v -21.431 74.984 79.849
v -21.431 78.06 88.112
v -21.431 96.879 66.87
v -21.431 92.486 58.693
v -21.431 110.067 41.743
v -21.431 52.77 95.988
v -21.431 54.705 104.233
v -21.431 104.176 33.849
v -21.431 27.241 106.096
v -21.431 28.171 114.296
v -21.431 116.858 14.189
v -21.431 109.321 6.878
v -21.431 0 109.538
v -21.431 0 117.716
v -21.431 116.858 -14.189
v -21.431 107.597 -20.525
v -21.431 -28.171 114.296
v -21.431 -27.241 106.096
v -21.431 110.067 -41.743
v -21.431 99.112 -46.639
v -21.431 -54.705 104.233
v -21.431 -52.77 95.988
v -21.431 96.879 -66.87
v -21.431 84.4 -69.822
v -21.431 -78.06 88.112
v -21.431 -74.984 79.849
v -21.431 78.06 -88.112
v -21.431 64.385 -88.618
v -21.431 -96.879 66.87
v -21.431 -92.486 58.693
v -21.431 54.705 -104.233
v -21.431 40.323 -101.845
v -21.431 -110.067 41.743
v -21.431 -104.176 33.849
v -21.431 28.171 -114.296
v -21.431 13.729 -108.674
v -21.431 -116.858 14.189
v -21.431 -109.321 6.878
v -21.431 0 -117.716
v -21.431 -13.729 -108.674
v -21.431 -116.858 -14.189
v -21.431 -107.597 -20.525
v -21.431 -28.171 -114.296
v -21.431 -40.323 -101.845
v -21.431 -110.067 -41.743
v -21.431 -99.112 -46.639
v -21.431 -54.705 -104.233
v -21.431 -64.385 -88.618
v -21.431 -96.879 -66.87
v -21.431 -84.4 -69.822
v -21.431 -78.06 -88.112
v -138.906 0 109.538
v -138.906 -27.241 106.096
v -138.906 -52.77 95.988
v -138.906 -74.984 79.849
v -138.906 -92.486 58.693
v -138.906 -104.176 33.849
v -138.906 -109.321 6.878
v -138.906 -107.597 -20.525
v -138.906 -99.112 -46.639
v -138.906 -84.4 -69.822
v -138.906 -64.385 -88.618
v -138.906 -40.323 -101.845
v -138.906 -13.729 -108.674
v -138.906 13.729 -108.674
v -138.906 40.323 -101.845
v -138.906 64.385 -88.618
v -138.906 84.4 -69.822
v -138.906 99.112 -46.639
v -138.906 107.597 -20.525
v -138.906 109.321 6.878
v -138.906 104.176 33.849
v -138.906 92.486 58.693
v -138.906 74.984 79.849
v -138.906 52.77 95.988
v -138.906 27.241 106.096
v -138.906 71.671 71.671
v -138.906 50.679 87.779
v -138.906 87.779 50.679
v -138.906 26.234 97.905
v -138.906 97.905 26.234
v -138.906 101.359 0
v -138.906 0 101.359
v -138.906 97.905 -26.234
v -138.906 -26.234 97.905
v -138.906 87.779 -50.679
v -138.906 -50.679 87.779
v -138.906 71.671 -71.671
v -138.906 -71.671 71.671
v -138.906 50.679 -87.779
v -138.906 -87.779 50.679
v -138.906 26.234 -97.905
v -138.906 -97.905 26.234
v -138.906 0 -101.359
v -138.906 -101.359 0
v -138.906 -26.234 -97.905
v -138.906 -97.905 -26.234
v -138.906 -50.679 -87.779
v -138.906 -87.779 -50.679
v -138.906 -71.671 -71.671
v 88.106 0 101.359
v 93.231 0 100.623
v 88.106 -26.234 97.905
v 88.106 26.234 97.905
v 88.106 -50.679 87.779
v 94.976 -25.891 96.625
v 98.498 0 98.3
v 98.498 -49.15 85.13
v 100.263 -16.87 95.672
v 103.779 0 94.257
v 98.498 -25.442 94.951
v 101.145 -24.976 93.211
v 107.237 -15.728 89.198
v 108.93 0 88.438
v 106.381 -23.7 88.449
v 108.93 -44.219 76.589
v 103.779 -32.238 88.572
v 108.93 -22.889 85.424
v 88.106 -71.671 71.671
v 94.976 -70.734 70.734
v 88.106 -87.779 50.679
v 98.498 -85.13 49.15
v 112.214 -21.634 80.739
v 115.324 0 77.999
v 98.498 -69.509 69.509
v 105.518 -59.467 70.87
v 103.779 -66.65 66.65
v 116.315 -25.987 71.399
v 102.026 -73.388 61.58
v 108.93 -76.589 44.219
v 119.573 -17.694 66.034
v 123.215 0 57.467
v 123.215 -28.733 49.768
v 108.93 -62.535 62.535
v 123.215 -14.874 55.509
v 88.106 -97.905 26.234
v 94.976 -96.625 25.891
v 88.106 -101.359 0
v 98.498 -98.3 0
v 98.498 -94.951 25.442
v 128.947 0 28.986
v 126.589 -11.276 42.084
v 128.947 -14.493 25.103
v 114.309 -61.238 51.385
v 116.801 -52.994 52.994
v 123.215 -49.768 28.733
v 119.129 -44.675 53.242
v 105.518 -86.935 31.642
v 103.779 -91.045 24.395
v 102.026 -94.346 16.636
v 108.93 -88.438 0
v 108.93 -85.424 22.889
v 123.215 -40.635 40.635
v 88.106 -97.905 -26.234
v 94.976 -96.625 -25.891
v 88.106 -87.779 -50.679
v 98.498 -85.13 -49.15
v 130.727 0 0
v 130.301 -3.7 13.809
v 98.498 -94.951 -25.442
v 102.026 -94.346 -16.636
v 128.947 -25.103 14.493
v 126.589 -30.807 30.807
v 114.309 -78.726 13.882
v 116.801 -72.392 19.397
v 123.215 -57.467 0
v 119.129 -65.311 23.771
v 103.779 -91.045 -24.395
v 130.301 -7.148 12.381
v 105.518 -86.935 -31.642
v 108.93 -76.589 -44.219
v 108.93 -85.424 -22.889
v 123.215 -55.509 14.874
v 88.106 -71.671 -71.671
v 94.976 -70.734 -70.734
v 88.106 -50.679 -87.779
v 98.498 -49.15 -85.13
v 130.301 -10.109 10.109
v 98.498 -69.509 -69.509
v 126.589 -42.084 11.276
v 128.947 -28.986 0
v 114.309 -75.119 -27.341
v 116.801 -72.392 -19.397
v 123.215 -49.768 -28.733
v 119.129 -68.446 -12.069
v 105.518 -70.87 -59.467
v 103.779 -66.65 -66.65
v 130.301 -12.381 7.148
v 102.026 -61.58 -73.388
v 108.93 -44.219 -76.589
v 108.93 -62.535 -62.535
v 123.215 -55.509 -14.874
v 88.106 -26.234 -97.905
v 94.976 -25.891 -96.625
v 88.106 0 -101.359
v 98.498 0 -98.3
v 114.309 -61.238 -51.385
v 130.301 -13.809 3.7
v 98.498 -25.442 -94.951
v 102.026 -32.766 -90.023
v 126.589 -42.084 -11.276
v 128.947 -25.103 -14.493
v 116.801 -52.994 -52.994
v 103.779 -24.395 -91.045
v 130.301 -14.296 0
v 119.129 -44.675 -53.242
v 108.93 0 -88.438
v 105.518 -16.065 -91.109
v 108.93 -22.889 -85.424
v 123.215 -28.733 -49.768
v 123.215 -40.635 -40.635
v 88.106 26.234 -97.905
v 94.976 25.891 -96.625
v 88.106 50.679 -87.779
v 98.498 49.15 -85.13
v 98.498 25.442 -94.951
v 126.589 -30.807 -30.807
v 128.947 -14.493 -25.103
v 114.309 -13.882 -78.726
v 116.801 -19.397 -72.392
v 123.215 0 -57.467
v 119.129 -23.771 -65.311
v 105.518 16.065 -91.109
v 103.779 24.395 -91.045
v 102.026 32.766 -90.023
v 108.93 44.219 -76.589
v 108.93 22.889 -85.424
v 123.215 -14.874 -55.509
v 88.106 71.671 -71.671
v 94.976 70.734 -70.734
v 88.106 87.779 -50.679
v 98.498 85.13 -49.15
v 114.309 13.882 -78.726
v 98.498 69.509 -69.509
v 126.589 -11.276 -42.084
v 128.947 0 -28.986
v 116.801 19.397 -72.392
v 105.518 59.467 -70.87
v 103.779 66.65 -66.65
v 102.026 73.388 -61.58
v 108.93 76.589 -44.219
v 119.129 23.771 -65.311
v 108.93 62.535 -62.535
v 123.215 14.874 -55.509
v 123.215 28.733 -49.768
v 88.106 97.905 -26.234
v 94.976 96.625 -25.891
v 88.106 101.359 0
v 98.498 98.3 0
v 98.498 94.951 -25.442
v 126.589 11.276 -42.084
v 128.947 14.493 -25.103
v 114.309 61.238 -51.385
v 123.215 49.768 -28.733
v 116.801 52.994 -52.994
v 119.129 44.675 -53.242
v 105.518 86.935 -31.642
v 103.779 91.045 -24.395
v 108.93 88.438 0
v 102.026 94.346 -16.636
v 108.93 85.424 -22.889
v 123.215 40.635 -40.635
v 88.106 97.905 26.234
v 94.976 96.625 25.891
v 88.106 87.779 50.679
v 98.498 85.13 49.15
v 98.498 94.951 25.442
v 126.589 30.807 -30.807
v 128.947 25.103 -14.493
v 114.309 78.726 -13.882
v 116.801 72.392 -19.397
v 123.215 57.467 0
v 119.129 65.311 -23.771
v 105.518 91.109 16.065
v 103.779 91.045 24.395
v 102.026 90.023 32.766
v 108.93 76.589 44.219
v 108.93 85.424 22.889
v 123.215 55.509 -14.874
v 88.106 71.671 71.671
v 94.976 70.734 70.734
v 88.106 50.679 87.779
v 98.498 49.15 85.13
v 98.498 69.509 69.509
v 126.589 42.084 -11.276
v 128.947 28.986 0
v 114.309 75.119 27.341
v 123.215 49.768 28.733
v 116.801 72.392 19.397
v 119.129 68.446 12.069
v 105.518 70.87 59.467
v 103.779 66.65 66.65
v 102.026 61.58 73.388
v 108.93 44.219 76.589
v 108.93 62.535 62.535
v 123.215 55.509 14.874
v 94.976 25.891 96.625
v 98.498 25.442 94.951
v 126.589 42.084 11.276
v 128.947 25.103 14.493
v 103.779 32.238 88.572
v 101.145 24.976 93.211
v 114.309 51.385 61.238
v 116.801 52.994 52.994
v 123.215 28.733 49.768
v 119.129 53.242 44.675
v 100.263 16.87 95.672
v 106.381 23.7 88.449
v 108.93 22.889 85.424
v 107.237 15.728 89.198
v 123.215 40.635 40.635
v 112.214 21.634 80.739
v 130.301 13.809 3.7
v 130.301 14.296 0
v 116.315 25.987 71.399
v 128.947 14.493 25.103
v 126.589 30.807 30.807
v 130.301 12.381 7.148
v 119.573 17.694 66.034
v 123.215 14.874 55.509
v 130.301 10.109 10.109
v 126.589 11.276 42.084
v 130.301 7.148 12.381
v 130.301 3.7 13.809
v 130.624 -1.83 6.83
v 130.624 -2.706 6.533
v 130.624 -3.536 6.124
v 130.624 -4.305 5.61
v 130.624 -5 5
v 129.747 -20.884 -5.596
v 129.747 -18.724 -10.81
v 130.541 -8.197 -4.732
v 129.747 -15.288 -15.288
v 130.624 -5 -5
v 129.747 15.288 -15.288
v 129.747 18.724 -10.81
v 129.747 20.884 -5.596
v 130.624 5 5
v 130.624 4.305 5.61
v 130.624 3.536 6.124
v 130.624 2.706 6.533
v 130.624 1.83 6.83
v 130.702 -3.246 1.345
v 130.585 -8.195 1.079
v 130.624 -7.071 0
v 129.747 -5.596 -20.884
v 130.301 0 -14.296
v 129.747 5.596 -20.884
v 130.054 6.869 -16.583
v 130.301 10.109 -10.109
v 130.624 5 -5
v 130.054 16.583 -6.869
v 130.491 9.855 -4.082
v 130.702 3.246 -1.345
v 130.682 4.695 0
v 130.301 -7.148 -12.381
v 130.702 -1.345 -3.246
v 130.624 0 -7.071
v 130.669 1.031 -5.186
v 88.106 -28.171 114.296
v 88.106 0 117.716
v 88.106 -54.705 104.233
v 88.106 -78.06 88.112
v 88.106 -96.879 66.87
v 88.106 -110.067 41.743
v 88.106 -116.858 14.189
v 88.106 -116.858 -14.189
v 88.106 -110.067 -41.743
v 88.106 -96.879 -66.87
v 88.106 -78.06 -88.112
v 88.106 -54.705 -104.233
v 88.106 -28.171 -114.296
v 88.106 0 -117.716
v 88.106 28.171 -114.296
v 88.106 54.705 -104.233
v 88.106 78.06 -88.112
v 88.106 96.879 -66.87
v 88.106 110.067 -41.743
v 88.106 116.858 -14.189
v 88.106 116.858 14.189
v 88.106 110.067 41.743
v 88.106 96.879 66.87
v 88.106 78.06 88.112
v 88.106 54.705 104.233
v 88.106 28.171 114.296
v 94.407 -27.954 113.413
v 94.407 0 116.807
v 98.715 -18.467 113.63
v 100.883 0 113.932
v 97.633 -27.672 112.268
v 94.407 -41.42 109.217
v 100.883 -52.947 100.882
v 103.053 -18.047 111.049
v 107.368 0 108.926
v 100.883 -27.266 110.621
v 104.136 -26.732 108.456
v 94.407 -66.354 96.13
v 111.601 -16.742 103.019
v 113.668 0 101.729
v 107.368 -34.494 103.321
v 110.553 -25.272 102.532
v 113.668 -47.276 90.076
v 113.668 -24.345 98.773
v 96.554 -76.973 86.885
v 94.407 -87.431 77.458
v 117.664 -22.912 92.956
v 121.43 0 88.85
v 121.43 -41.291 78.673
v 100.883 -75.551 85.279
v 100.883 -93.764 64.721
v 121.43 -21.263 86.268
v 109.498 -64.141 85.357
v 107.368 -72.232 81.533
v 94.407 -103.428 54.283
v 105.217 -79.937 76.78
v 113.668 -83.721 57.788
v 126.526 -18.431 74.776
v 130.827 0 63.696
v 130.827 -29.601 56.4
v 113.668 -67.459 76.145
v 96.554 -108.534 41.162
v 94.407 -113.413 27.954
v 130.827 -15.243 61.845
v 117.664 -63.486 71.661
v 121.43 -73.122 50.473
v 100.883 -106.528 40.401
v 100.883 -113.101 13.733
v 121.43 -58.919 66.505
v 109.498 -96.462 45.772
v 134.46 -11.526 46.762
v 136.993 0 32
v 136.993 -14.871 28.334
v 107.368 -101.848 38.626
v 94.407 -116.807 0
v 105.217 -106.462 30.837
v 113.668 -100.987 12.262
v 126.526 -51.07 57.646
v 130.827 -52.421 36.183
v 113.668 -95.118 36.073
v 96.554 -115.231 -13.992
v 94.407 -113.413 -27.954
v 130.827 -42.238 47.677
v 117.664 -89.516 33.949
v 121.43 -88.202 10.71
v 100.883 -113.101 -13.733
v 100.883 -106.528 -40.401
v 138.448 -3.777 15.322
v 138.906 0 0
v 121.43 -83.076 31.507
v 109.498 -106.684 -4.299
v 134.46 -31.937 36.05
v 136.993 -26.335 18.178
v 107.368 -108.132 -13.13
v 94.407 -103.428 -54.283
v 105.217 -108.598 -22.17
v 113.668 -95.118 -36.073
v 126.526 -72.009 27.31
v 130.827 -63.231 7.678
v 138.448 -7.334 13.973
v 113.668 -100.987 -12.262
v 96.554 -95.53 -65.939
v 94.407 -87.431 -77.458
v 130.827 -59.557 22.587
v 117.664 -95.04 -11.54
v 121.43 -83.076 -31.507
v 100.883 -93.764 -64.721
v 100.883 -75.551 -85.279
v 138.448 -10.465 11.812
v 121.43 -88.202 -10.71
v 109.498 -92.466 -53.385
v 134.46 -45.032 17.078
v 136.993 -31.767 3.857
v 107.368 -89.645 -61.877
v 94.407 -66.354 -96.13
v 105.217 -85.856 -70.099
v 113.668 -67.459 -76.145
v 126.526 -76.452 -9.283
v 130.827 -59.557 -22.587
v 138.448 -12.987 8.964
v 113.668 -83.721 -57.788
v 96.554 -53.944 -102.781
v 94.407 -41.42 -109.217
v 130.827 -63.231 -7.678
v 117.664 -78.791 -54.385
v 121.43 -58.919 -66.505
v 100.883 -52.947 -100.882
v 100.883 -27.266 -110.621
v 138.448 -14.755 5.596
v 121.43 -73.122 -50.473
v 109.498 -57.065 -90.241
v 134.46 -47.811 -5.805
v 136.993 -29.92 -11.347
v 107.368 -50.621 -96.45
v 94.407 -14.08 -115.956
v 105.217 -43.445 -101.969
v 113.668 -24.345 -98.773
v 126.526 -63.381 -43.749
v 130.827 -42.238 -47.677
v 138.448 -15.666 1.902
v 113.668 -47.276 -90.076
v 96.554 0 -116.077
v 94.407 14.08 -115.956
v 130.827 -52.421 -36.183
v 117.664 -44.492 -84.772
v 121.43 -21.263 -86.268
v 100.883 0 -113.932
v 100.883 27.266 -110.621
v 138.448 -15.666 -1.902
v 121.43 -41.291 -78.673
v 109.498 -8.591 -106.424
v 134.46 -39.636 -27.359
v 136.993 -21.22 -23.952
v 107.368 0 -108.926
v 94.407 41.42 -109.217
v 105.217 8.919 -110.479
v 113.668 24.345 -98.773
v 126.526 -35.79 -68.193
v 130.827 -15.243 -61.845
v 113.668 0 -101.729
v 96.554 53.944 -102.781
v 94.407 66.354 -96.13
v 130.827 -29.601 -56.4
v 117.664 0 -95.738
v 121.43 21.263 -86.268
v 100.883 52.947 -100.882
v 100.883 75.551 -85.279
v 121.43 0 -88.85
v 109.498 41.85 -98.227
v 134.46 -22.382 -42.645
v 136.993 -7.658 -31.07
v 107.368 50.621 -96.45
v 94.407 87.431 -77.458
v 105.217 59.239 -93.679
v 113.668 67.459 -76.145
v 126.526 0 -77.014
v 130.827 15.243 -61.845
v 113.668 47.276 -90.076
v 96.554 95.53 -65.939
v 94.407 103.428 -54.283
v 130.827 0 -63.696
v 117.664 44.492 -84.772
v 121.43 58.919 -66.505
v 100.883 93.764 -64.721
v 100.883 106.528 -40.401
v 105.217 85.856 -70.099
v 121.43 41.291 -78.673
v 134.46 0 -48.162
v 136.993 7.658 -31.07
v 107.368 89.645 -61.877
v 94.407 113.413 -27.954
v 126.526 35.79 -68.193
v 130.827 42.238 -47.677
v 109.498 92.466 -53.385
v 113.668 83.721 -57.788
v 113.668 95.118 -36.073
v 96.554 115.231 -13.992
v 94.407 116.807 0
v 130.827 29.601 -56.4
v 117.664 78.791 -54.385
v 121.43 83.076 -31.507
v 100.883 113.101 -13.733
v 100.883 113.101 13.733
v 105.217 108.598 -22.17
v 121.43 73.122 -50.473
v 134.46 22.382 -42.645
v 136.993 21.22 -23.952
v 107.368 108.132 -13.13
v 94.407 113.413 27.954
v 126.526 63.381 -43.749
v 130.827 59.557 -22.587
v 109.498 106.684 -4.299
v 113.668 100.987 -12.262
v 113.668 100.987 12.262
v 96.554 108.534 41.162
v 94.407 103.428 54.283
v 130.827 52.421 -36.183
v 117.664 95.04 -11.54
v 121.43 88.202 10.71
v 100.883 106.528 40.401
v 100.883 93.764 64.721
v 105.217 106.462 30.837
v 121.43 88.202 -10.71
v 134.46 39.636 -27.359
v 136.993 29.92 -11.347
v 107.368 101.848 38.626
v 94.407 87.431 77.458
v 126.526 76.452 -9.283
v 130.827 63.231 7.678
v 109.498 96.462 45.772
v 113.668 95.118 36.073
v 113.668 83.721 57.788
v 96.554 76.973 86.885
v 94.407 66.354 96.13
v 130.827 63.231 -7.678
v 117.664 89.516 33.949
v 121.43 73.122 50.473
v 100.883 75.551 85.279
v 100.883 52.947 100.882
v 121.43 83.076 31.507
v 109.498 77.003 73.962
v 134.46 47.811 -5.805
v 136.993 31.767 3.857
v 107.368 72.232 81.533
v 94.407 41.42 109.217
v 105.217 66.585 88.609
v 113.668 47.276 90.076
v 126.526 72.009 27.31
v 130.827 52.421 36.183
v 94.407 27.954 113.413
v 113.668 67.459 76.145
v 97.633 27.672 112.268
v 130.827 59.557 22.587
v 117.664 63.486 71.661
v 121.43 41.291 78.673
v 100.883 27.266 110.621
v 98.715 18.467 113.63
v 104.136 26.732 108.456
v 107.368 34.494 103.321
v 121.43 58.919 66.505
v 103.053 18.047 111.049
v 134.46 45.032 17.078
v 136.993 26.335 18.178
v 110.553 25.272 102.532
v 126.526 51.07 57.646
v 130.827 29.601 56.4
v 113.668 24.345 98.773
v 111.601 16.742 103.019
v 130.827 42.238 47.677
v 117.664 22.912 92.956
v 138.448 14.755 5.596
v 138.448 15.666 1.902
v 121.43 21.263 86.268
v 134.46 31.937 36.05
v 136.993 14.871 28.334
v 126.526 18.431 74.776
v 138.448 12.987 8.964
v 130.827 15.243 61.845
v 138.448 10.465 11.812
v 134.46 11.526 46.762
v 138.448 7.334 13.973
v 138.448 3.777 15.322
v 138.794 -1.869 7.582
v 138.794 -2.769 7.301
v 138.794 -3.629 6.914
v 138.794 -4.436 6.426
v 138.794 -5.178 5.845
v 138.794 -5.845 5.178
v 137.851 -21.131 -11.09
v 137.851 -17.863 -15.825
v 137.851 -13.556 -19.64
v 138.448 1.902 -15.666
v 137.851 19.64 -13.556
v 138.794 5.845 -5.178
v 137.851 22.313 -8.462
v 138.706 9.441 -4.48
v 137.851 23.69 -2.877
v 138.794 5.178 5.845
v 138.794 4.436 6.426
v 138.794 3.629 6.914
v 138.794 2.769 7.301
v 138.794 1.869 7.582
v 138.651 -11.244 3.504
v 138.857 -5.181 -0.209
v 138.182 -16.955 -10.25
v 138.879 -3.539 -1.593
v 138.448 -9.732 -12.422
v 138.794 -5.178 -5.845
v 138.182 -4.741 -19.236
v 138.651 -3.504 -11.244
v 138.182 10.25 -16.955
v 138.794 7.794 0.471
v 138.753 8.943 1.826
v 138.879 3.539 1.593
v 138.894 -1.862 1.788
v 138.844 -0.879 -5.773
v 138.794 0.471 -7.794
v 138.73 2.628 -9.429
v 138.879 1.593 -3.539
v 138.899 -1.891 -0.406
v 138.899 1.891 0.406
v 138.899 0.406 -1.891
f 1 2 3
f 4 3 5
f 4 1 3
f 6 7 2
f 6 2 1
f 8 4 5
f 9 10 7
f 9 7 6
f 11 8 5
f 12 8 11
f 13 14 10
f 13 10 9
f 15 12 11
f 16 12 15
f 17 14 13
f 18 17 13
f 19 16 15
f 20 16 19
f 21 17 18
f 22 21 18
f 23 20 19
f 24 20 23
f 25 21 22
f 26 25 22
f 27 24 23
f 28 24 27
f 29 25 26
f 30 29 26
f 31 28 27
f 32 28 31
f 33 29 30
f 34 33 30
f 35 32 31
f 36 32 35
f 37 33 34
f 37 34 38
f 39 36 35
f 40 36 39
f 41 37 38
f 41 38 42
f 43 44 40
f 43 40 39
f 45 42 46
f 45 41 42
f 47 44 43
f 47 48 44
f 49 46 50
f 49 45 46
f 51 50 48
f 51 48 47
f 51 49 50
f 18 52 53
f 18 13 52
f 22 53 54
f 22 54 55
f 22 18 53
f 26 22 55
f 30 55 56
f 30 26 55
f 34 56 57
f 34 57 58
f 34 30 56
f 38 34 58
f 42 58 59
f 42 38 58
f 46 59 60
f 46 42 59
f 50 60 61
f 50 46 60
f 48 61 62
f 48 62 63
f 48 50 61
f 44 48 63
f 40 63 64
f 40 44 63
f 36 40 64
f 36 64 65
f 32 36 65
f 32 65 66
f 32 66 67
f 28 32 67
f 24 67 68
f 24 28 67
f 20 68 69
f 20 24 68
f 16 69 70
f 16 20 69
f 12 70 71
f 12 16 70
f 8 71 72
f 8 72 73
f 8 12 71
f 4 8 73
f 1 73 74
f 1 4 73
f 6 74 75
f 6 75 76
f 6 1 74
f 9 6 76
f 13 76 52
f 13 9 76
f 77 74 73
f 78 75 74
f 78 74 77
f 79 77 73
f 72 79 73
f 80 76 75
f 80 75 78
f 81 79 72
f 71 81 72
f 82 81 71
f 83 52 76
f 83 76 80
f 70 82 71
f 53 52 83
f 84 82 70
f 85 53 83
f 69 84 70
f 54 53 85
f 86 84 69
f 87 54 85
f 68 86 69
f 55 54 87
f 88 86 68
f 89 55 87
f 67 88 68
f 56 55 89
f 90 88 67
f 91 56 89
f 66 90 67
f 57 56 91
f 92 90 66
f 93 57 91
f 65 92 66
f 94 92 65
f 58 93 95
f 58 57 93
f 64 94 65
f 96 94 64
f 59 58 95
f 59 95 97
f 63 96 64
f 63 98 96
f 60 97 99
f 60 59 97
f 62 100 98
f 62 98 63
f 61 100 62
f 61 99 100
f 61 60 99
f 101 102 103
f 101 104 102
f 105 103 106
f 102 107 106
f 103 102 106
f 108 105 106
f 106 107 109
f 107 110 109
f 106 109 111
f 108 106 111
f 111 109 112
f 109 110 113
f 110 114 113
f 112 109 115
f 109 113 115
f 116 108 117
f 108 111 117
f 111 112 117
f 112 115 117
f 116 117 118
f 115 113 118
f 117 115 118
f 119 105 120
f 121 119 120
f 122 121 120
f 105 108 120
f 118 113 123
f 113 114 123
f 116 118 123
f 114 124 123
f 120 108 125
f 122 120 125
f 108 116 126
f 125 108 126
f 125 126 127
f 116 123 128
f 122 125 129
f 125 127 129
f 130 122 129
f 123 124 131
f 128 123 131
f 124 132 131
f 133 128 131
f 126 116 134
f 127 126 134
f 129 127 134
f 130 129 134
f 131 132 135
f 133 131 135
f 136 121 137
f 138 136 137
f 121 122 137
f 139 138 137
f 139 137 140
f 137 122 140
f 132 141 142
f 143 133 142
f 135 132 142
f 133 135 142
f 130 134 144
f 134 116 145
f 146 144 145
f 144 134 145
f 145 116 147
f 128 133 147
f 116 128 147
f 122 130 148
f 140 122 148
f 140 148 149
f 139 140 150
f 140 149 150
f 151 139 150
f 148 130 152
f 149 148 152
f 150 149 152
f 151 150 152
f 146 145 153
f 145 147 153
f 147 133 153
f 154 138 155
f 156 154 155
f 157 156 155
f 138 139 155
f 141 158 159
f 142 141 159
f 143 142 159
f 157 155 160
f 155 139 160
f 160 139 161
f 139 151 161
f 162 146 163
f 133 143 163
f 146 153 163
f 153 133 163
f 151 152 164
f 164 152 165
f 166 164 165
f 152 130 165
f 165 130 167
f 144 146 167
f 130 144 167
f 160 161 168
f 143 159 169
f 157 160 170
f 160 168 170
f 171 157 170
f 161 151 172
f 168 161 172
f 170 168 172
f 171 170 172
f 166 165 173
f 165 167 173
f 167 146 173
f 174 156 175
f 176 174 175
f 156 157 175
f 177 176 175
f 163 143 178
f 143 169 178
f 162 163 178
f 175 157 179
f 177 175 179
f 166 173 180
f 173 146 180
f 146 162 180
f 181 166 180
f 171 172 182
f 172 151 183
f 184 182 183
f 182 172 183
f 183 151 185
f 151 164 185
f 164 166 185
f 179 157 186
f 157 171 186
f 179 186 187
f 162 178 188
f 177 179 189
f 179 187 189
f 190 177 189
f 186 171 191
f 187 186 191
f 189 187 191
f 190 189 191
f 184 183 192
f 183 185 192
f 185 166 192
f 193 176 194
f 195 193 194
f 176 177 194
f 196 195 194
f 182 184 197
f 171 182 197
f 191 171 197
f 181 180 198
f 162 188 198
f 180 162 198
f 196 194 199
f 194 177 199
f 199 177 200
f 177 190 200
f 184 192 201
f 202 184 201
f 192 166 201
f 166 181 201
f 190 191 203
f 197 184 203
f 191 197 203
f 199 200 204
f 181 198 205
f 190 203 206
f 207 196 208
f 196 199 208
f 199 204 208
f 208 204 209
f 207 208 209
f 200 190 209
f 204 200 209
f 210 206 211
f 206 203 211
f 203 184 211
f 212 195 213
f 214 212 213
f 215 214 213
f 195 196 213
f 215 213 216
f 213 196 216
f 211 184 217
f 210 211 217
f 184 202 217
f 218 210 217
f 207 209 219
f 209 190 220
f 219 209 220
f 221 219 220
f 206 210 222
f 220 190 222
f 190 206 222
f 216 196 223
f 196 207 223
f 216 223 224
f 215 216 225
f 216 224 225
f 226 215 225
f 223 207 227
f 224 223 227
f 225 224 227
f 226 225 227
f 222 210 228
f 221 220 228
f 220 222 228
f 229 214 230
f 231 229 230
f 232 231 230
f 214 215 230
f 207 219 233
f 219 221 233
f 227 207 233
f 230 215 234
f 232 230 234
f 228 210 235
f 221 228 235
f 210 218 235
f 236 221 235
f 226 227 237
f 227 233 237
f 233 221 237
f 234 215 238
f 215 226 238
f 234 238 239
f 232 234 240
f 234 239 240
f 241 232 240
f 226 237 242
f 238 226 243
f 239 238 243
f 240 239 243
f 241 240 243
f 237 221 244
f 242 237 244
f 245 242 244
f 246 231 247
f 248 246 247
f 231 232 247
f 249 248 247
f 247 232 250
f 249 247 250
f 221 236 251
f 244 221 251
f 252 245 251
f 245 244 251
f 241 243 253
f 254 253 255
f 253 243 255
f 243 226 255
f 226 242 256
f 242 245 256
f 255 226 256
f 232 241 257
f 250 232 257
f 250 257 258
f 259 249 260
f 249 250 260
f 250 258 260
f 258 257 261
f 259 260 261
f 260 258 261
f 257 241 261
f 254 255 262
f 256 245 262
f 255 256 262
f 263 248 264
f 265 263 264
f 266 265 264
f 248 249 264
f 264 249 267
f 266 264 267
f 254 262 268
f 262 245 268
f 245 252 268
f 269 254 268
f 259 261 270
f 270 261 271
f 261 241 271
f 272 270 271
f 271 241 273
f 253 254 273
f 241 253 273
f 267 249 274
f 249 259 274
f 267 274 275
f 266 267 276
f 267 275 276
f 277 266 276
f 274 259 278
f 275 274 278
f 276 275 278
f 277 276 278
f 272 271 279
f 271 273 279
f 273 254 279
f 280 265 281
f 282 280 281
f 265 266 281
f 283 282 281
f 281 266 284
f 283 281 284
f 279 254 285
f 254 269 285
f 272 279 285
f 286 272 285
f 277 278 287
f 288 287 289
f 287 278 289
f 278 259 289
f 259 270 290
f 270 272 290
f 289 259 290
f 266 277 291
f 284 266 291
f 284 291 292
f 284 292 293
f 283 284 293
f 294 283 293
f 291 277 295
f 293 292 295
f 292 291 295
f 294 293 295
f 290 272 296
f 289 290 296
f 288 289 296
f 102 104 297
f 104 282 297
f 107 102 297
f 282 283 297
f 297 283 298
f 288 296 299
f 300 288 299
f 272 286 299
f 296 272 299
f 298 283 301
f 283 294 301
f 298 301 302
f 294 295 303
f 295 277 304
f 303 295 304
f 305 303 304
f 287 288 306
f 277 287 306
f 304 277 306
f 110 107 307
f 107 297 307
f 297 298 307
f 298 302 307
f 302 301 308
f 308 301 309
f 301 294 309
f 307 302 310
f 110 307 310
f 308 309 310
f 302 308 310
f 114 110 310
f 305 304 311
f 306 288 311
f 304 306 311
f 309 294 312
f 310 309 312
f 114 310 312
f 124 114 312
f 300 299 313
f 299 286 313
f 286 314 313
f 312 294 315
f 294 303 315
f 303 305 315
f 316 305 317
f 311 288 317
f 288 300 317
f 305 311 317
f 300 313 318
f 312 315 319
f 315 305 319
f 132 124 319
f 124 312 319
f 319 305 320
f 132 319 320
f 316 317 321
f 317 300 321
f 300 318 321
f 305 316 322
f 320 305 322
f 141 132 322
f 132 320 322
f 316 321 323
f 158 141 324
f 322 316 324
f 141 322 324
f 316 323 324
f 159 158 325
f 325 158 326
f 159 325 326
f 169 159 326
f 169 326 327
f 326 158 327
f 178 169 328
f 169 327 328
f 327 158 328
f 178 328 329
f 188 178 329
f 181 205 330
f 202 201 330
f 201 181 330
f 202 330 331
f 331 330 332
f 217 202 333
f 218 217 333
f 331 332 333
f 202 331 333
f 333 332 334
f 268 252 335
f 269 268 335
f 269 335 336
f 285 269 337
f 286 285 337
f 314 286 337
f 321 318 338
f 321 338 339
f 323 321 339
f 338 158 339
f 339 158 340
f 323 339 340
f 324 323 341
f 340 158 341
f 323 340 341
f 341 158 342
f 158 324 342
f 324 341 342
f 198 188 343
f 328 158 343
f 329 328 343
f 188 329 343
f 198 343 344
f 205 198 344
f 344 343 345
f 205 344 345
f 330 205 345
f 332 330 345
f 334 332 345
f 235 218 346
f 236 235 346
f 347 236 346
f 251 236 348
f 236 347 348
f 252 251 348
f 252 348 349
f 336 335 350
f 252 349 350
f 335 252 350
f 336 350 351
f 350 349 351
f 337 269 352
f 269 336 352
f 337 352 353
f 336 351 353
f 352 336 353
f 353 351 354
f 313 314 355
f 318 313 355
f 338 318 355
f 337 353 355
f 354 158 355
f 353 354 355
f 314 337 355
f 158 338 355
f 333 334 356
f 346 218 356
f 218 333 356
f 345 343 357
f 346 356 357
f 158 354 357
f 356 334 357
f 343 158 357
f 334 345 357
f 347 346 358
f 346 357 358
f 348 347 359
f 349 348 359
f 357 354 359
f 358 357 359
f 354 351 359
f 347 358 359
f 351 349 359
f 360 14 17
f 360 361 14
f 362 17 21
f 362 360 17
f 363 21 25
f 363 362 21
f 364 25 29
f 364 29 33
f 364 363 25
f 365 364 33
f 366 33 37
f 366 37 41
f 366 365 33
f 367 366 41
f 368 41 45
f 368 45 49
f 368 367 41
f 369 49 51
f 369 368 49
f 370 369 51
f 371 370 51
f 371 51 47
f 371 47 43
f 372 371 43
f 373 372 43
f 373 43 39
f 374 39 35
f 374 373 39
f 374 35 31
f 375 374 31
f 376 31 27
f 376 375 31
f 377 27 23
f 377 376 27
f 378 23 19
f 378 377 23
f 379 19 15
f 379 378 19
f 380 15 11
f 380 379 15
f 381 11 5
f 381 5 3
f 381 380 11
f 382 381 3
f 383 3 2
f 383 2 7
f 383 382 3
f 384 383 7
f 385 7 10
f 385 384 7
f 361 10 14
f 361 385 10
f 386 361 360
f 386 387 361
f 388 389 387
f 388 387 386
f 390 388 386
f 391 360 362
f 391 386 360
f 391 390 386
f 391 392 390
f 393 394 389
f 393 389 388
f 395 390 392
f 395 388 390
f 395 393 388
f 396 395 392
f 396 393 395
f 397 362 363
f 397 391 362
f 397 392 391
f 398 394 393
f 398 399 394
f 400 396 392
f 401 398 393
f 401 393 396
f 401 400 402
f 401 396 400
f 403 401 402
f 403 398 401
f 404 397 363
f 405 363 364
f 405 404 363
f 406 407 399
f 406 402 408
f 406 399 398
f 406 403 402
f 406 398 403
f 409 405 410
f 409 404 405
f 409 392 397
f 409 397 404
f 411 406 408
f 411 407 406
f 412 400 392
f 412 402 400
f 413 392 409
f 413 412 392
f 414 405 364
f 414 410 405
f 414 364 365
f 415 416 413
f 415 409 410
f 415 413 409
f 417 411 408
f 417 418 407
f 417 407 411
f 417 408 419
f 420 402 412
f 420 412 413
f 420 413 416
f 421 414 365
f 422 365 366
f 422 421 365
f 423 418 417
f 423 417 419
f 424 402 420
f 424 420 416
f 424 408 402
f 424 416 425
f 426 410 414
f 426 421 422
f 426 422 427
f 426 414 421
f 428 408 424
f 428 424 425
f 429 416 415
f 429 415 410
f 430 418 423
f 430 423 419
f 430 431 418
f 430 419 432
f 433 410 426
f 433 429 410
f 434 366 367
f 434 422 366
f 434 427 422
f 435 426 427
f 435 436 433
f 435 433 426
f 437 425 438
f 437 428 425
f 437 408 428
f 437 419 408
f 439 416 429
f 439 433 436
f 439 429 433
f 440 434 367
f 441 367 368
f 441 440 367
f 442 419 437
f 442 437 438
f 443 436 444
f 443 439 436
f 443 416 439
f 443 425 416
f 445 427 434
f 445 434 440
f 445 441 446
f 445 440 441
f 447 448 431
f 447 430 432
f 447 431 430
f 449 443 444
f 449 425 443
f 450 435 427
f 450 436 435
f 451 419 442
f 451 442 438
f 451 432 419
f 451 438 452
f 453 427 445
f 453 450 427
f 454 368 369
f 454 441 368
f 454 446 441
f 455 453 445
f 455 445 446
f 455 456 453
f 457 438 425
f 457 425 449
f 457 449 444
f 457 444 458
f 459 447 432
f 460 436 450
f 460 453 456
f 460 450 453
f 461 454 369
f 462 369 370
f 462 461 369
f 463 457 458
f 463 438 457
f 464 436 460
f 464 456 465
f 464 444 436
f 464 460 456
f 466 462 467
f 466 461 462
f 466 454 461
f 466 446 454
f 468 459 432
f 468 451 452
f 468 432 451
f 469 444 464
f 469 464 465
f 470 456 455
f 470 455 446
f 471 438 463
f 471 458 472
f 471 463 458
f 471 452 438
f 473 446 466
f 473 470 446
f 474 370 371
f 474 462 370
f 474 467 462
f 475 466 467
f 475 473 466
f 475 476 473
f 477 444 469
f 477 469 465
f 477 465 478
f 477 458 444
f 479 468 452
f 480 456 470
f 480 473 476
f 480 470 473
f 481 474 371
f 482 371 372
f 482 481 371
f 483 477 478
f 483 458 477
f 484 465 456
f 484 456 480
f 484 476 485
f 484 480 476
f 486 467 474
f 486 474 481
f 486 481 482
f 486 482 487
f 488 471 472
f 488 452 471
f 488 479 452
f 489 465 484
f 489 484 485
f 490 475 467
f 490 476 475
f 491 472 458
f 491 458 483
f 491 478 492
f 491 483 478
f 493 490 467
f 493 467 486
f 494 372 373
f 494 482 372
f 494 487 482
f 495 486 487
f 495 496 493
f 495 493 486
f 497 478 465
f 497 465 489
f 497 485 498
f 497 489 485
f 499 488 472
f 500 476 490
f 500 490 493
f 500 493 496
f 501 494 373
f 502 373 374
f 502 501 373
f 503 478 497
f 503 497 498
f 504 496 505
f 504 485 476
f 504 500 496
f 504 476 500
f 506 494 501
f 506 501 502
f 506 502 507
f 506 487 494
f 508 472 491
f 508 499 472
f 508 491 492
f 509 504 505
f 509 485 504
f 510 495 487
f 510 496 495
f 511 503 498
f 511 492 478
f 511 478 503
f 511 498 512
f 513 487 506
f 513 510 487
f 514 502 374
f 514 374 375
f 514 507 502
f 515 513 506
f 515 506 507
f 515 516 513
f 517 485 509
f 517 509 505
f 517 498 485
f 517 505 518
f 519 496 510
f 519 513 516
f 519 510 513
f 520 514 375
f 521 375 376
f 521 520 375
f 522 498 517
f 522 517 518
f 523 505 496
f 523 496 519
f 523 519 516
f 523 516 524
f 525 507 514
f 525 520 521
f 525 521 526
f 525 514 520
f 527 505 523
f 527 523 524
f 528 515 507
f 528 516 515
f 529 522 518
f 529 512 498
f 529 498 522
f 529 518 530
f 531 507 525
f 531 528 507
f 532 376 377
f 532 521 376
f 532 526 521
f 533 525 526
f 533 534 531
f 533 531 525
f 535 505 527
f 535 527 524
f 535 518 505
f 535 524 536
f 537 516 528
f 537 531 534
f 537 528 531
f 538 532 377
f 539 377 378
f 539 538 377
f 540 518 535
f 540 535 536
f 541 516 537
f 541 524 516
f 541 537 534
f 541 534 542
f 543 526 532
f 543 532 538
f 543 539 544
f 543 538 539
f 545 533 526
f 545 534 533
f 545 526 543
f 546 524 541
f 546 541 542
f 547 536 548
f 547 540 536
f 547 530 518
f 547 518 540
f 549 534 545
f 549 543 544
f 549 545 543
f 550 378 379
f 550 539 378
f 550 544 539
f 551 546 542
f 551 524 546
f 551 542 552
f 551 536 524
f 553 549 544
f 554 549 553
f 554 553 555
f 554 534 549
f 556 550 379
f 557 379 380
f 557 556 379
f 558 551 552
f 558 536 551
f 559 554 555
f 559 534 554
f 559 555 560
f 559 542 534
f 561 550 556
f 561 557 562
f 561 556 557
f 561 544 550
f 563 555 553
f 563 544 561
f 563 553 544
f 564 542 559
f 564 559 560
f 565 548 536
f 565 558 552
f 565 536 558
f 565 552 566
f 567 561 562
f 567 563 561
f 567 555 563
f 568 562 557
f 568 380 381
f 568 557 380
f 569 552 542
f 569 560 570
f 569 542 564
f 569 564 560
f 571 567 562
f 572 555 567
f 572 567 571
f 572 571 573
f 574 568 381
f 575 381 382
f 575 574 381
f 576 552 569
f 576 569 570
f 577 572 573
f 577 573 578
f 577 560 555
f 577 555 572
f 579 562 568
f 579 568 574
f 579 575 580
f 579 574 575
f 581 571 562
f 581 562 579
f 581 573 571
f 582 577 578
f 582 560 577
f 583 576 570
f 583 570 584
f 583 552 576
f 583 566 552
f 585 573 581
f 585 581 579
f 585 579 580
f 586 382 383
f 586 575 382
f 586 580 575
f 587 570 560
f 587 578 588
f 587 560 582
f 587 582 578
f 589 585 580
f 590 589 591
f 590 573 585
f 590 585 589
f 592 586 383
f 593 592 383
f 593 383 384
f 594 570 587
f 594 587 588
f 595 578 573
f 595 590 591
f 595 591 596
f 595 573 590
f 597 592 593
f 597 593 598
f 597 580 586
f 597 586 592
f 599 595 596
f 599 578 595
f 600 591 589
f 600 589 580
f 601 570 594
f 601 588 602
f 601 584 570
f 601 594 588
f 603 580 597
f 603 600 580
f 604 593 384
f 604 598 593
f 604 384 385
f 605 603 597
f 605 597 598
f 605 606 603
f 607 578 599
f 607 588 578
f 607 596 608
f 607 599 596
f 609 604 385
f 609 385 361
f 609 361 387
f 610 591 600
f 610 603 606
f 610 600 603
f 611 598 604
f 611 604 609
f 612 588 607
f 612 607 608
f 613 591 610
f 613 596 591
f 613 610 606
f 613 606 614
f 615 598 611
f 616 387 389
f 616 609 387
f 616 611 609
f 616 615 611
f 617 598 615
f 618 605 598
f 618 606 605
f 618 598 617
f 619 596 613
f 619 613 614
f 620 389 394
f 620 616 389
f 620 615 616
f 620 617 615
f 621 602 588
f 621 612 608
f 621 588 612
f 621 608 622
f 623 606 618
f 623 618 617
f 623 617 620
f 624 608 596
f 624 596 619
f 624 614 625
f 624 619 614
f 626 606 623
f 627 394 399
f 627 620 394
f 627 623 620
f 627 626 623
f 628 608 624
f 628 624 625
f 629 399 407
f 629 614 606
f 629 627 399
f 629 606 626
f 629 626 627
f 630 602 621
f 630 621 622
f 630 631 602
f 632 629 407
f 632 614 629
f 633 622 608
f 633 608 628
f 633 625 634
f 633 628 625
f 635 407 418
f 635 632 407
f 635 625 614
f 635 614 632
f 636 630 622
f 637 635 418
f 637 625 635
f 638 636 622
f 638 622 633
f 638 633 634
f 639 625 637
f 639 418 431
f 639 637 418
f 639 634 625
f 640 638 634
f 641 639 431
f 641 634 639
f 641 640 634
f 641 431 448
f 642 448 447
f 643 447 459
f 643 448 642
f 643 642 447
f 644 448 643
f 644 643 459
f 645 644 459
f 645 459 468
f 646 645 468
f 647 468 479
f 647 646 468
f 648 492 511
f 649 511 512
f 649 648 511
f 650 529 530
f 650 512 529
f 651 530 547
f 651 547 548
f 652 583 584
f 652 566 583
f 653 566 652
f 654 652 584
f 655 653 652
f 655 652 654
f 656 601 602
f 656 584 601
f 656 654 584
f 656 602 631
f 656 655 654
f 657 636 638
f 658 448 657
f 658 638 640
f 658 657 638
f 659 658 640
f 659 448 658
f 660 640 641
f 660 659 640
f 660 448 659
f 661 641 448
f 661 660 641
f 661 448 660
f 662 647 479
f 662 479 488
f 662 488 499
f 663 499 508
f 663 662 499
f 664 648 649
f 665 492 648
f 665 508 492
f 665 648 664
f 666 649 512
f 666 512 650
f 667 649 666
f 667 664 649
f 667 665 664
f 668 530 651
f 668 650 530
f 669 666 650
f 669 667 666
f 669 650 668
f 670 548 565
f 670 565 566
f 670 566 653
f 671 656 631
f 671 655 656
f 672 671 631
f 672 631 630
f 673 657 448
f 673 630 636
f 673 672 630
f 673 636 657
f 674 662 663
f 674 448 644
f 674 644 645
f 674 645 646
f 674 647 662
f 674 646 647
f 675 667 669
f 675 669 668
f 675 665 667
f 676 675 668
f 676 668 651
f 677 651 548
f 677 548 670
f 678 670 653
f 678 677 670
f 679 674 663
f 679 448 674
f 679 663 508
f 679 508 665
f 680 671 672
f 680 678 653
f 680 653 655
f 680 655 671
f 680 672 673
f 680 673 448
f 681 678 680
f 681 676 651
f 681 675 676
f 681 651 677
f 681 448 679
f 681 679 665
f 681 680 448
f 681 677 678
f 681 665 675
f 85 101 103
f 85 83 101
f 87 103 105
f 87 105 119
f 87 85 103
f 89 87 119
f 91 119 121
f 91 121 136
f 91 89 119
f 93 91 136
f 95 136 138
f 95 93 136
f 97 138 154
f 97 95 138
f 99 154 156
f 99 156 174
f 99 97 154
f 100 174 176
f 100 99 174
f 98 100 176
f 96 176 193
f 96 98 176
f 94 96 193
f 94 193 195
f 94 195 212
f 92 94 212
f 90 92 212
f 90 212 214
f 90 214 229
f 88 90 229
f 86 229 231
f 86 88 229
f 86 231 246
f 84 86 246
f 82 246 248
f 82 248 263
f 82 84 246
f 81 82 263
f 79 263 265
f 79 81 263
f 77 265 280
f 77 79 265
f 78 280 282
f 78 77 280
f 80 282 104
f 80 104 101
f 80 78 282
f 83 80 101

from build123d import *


with BuildPart() as part:
    # Sketch1 → Revolve1 (revolve)
    with BuildSketch(Plane.XY, mode=Mode.PRIVATE) as revolve1_sk:
        with BuildLine():
            Line((-138.90625, -109.5375), (-21.43125, -109.5375))
            Line((-21.43125, -109.5375), (-21.43125, -117.7163))
            Line((-21.43125, -117.7163), (88.10625, -117.7163))
            add(Edge.make_bspline(
                [(88.10625, -117.7163), (138.90625, -117.7163), (138.90625, 0)],
                knots=[3.141592654, 3.141592654, 3.141592654, 4.71238898, 4.71238898, 4.71238898], degree=2, weights=[1, 0.707106781, 1]))
            Line((138.90625, 0), (130.72745, 0))
            add(Edge.make_bspline(
                [(88.10625, -101.3587), (130.72745, -101.3587), (130.72745, 0)],
                knots=[0, 0, 0, 1.570796327, 1.570796327, 1.570796327], degree=2, weights=[1, 0.707106781, 1]))
            Line((88.10625, -101.3587), (-138.90625, -101.3587))
            Line((-138.90625, -101.3587), (-138.90625, -109.5375))
        make_face()
    revolve(revolve1_sk.sketch.rotate(Axis((-138.90625, 0, 0), (1, 0, 0)), 270), axis=Axis((-138.90625, 0, 0), (1, 0, 0)))


solid = part.part
